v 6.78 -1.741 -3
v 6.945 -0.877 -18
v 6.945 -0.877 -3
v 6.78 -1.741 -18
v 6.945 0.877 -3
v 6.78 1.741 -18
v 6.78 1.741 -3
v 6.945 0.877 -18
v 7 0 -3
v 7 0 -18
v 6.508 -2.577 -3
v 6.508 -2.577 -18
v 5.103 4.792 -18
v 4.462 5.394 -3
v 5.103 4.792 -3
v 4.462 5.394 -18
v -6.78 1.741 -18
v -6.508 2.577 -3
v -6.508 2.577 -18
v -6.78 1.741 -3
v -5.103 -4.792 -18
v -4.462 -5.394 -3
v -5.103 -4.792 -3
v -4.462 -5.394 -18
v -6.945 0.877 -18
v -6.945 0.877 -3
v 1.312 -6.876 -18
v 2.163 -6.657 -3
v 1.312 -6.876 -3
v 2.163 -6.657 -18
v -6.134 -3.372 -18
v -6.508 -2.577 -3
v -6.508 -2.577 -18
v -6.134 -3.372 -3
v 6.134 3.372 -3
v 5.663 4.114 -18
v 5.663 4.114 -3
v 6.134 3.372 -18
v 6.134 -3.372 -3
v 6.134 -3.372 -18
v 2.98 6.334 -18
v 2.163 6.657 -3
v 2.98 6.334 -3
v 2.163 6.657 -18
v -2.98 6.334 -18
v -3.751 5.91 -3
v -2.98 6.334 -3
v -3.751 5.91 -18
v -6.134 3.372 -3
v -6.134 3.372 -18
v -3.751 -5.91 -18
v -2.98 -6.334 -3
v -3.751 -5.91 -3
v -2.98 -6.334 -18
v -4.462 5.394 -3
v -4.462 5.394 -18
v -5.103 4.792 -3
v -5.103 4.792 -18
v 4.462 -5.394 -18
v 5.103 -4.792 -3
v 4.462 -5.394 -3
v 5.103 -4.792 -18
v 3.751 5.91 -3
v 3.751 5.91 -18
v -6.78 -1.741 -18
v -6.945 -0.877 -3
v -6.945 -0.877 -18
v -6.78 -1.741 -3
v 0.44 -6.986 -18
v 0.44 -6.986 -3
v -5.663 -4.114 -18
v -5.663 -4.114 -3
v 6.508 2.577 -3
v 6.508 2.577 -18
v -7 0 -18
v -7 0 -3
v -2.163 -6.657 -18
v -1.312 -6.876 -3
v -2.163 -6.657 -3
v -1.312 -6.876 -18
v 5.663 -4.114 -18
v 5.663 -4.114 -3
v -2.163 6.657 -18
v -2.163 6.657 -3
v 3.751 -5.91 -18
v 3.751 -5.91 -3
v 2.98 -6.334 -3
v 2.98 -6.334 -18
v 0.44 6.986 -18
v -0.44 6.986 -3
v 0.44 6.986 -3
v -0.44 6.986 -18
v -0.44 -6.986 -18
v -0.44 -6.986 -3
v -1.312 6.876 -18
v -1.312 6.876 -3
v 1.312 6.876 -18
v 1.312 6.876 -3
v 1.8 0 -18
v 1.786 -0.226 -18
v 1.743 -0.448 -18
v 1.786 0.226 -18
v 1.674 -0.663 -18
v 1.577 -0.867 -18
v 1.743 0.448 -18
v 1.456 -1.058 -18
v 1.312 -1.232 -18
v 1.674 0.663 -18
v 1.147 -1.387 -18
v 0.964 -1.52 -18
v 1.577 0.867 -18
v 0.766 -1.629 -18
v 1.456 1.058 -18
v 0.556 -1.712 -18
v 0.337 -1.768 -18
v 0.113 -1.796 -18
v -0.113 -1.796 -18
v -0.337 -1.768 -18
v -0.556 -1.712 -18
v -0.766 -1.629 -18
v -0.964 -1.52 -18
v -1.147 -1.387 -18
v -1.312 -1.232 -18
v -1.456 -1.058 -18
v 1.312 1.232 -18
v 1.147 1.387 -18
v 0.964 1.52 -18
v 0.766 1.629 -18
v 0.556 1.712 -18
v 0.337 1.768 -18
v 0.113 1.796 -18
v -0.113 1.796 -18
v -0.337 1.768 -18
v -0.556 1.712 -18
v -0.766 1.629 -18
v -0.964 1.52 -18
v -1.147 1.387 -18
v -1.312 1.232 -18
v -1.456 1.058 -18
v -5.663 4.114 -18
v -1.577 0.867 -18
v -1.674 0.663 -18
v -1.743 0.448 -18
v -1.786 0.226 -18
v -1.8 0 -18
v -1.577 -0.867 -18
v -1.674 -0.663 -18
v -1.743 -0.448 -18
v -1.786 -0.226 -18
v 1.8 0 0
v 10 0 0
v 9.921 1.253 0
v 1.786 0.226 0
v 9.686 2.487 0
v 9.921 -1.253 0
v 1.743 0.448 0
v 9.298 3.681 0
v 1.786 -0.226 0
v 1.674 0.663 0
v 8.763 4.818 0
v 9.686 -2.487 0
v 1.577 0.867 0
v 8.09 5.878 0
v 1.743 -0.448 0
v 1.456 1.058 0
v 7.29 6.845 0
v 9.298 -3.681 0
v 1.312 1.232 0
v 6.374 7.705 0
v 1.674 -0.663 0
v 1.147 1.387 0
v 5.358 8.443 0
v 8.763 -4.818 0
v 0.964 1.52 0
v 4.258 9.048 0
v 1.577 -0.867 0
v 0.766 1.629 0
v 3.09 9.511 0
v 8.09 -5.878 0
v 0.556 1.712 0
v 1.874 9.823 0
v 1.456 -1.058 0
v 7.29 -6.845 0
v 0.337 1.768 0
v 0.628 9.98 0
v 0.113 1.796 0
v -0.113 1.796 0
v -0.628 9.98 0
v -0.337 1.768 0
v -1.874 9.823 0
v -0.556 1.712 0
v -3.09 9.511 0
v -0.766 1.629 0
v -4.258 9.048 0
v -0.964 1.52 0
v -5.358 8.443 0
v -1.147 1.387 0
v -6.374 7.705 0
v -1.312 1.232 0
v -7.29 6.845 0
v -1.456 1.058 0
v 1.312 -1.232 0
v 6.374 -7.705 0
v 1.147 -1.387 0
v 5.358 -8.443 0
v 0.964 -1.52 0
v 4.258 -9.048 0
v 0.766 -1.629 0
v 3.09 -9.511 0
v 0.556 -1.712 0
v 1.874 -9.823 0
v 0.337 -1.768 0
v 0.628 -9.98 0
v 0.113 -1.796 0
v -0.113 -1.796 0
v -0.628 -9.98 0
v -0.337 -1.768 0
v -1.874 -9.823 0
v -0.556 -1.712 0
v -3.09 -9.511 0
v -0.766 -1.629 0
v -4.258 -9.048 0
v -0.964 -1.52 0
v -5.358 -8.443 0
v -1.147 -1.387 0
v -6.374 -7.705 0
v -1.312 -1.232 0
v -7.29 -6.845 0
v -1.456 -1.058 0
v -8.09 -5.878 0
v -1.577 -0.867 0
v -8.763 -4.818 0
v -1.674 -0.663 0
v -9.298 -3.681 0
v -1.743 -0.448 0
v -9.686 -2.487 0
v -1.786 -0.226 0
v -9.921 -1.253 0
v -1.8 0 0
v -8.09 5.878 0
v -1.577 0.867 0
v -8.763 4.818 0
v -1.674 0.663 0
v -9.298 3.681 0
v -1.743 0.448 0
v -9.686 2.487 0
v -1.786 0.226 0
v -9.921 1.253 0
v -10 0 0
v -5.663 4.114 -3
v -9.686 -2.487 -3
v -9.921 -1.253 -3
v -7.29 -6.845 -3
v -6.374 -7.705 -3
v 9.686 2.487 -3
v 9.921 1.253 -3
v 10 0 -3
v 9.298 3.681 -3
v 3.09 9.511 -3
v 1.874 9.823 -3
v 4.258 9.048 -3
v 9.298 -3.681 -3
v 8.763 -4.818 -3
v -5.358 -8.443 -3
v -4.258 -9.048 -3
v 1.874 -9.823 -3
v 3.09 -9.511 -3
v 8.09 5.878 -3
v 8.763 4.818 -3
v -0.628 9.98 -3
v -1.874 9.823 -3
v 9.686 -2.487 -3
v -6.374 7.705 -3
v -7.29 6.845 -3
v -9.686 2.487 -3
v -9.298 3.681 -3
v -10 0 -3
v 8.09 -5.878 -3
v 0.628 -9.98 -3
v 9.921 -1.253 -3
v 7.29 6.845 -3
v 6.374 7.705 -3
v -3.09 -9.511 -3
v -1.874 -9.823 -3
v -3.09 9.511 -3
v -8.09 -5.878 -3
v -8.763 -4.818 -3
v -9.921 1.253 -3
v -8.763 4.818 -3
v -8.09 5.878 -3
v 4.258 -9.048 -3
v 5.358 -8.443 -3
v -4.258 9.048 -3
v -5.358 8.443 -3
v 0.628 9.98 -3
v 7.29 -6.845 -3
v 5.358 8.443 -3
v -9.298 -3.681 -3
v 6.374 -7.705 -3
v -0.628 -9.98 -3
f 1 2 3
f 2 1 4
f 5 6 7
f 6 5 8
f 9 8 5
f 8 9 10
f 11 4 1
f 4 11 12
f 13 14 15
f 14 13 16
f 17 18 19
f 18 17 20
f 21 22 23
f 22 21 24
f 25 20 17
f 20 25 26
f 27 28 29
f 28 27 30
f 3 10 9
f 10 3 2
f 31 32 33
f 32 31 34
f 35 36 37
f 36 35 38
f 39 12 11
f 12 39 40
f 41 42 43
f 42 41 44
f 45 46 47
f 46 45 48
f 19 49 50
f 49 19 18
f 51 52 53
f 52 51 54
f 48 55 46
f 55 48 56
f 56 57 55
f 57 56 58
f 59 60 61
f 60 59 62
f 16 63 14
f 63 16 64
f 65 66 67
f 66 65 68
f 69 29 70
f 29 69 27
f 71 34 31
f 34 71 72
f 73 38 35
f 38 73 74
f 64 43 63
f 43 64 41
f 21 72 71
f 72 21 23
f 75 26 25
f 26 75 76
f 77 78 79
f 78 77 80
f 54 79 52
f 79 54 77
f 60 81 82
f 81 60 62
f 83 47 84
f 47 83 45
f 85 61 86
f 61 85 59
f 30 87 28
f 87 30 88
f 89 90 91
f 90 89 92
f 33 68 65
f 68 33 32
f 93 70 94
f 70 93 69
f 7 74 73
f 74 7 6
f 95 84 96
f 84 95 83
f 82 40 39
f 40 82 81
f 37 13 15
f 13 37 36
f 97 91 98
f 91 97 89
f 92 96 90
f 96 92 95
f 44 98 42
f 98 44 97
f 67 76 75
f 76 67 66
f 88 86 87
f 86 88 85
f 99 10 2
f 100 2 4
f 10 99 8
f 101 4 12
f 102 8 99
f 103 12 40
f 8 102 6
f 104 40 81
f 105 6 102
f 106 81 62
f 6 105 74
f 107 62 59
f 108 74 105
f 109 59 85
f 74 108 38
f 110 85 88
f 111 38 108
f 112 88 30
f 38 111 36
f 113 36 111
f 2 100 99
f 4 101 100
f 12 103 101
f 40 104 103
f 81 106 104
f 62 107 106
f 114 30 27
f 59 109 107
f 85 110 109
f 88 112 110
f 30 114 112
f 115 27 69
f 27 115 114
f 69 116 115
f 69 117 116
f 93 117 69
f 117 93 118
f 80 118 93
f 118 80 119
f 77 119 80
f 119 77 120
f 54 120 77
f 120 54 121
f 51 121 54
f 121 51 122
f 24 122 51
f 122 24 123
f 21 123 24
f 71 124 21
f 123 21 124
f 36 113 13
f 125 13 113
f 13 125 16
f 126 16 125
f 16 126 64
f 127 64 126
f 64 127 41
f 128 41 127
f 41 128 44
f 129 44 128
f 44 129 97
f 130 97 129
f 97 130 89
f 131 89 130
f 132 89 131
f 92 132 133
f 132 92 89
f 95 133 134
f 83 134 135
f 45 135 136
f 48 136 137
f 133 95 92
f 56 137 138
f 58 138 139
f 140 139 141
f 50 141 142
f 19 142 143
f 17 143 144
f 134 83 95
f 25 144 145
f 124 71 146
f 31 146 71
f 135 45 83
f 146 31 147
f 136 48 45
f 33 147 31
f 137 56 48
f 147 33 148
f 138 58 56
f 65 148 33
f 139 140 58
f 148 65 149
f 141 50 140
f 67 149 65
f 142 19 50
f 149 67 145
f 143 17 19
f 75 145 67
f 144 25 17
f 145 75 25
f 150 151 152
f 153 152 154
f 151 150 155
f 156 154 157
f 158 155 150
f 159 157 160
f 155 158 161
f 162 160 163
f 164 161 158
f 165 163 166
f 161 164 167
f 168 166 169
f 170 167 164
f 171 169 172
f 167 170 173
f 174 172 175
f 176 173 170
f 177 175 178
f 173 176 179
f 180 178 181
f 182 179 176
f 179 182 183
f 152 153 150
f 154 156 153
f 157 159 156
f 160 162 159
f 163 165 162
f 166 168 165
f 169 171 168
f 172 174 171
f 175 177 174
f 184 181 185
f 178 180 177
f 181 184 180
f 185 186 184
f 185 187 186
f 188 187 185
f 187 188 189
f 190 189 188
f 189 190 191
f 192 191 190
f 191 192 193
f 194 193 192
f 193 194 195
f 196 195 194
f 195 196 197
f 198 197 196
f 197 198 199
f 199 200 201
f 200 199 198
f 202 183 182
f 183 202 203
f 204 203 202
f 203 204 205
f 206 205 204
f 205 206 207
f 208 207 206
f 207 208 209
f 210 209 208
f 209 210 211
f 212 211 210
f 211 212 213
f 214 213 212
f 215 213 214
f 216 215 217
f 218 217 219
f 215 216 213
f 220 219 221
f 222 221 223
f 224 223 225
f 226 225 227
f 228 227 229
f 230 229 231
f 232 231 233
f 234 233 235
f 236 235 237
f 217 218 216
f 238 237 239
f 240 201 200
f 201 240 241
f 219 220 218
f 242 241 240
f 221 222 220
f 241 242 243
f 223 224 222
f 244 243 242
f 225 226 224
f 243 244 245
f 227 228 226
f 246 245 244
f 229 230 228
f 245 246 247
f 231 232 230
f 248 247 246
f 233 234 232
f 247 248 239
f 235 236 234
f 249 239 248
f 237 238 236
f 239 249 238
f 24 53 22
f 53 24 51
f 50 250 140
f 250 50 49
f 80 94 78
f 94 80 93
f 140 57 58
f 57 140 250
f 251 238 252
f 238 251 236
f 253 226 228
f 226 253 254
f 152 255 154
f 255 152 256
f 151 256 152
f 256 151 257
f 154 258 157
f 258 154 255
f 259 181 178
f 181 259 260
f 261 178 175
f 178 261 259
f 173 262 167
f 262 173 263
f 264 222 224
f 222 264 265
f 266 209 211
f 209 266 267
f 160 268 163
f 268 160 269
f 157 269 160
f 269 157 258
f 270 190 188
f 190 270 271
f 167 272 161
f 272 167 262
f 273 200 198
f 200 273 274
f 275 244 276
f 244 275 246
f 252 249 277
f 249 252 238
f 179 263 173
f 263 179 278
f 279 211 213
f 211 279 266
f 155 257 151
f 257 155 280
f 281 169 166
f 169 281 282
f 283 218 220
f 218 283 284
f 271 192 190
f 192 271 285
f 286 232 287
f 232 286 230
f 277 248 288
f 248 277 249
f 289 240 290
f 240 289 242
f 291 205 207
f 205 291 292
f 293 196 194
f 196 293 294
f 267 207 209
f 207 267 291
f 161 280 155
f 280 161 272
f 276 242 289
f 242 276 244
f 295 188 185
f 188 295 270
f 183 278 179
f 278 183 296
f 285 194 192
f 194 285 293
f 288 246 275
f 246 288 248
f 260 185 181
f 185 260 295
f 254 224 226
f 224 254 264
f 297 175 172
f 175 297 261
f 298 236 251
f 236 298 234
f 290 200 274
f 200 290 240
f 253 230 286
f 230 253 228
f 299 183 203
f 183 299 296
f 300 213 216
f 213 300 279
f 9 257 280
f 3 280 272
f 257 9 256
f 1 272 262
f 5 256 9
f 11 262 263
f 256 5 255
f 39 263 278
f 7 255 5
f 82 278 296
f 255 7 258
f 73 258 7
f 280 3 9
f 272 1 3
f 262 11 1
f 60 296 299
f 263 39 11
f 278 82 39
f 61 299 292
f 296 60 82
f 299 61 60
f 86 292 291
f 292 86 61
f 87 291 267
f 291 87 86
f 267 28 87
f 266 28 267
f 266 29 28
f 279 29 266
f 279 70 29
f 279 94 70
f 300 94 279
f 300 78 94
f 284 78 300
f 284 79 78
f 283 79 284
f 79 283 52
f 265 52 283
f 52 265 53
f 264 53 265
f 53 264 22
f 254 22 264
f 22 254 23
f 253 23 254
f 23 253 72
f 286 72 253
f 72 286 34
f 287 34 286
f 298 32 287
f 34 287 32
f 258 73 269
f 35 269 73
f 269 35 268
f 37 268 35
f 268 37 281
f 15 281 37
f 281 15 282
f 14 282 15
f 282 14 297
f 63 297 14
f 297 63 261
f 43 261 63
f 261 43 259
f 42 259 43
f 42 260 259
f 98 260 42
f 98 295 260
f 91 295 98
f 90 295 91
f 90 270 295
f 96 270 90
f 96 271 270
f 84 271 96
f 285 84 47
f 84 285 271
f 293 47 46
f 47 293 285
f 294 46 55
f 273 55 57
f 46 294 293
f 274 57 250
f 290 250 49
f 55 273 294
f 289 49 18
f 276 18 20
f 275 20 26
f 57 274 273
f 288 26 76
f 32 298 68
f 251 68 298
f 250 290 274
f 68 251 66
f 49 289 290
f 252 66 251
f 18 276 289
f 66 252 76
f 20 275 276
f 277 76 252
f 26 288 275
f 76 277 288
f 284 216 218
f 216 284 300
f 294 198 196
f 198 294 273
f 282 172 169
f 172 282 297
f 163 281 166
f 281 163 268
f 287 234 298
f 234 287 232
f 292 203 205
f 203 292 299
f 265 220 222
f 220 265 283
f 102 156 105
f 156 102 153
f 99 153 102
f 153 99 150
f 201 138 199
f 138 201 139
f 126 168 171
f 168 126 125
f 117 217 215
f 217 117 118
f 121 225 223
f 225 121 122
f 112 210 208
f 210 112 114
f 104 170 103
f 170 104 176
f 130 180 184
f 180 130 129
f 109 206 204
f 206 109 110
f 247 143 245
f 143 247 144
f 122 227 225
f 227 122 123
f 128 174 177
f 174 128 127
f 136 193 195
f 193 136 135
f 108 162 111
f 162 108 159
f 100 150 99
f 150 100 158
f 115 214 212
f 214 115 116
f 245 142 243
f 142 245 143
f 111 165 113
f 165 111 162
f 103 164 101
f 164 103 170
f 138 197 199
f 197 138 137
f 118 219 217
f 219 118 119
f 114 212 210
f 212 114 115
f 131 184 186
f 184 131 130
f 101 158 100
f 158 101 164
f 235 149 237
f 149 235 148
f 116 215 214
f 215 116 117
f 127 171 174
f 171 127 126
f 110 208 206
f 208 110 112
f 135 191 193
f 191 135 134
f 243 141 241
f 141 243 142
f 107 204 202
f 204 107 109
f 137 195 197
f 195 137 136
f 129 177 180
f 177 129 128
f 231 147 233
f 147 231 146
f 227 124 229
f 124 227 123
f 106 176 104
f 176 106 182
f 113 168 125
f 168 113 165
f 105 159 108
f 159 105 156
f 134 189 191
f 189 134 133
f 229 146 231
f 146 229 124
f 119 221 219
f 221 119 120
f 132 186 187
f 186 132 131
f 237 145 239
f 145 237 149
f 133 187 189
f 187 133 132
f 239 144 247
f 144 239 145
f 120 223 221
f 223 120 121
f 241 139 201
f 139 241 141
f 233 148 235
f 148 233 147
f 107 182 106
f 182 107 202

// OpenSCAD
$fn = 50;


difference() {
	union() {
		translate(v = [0, 0, -18.0000000000]) {
			cylinder(h = 18, r = 7.0000000000);
		}
		translate(v = [0, 0, -3.0000000000]) {
			cylinder(h = 3, r = 10.0000000000);
		}
	}
	union() {
		#translate(v = [0, 0, -18]) {
			cylinder(h = 18, r = 1.8000000000);
		}
	}
}
